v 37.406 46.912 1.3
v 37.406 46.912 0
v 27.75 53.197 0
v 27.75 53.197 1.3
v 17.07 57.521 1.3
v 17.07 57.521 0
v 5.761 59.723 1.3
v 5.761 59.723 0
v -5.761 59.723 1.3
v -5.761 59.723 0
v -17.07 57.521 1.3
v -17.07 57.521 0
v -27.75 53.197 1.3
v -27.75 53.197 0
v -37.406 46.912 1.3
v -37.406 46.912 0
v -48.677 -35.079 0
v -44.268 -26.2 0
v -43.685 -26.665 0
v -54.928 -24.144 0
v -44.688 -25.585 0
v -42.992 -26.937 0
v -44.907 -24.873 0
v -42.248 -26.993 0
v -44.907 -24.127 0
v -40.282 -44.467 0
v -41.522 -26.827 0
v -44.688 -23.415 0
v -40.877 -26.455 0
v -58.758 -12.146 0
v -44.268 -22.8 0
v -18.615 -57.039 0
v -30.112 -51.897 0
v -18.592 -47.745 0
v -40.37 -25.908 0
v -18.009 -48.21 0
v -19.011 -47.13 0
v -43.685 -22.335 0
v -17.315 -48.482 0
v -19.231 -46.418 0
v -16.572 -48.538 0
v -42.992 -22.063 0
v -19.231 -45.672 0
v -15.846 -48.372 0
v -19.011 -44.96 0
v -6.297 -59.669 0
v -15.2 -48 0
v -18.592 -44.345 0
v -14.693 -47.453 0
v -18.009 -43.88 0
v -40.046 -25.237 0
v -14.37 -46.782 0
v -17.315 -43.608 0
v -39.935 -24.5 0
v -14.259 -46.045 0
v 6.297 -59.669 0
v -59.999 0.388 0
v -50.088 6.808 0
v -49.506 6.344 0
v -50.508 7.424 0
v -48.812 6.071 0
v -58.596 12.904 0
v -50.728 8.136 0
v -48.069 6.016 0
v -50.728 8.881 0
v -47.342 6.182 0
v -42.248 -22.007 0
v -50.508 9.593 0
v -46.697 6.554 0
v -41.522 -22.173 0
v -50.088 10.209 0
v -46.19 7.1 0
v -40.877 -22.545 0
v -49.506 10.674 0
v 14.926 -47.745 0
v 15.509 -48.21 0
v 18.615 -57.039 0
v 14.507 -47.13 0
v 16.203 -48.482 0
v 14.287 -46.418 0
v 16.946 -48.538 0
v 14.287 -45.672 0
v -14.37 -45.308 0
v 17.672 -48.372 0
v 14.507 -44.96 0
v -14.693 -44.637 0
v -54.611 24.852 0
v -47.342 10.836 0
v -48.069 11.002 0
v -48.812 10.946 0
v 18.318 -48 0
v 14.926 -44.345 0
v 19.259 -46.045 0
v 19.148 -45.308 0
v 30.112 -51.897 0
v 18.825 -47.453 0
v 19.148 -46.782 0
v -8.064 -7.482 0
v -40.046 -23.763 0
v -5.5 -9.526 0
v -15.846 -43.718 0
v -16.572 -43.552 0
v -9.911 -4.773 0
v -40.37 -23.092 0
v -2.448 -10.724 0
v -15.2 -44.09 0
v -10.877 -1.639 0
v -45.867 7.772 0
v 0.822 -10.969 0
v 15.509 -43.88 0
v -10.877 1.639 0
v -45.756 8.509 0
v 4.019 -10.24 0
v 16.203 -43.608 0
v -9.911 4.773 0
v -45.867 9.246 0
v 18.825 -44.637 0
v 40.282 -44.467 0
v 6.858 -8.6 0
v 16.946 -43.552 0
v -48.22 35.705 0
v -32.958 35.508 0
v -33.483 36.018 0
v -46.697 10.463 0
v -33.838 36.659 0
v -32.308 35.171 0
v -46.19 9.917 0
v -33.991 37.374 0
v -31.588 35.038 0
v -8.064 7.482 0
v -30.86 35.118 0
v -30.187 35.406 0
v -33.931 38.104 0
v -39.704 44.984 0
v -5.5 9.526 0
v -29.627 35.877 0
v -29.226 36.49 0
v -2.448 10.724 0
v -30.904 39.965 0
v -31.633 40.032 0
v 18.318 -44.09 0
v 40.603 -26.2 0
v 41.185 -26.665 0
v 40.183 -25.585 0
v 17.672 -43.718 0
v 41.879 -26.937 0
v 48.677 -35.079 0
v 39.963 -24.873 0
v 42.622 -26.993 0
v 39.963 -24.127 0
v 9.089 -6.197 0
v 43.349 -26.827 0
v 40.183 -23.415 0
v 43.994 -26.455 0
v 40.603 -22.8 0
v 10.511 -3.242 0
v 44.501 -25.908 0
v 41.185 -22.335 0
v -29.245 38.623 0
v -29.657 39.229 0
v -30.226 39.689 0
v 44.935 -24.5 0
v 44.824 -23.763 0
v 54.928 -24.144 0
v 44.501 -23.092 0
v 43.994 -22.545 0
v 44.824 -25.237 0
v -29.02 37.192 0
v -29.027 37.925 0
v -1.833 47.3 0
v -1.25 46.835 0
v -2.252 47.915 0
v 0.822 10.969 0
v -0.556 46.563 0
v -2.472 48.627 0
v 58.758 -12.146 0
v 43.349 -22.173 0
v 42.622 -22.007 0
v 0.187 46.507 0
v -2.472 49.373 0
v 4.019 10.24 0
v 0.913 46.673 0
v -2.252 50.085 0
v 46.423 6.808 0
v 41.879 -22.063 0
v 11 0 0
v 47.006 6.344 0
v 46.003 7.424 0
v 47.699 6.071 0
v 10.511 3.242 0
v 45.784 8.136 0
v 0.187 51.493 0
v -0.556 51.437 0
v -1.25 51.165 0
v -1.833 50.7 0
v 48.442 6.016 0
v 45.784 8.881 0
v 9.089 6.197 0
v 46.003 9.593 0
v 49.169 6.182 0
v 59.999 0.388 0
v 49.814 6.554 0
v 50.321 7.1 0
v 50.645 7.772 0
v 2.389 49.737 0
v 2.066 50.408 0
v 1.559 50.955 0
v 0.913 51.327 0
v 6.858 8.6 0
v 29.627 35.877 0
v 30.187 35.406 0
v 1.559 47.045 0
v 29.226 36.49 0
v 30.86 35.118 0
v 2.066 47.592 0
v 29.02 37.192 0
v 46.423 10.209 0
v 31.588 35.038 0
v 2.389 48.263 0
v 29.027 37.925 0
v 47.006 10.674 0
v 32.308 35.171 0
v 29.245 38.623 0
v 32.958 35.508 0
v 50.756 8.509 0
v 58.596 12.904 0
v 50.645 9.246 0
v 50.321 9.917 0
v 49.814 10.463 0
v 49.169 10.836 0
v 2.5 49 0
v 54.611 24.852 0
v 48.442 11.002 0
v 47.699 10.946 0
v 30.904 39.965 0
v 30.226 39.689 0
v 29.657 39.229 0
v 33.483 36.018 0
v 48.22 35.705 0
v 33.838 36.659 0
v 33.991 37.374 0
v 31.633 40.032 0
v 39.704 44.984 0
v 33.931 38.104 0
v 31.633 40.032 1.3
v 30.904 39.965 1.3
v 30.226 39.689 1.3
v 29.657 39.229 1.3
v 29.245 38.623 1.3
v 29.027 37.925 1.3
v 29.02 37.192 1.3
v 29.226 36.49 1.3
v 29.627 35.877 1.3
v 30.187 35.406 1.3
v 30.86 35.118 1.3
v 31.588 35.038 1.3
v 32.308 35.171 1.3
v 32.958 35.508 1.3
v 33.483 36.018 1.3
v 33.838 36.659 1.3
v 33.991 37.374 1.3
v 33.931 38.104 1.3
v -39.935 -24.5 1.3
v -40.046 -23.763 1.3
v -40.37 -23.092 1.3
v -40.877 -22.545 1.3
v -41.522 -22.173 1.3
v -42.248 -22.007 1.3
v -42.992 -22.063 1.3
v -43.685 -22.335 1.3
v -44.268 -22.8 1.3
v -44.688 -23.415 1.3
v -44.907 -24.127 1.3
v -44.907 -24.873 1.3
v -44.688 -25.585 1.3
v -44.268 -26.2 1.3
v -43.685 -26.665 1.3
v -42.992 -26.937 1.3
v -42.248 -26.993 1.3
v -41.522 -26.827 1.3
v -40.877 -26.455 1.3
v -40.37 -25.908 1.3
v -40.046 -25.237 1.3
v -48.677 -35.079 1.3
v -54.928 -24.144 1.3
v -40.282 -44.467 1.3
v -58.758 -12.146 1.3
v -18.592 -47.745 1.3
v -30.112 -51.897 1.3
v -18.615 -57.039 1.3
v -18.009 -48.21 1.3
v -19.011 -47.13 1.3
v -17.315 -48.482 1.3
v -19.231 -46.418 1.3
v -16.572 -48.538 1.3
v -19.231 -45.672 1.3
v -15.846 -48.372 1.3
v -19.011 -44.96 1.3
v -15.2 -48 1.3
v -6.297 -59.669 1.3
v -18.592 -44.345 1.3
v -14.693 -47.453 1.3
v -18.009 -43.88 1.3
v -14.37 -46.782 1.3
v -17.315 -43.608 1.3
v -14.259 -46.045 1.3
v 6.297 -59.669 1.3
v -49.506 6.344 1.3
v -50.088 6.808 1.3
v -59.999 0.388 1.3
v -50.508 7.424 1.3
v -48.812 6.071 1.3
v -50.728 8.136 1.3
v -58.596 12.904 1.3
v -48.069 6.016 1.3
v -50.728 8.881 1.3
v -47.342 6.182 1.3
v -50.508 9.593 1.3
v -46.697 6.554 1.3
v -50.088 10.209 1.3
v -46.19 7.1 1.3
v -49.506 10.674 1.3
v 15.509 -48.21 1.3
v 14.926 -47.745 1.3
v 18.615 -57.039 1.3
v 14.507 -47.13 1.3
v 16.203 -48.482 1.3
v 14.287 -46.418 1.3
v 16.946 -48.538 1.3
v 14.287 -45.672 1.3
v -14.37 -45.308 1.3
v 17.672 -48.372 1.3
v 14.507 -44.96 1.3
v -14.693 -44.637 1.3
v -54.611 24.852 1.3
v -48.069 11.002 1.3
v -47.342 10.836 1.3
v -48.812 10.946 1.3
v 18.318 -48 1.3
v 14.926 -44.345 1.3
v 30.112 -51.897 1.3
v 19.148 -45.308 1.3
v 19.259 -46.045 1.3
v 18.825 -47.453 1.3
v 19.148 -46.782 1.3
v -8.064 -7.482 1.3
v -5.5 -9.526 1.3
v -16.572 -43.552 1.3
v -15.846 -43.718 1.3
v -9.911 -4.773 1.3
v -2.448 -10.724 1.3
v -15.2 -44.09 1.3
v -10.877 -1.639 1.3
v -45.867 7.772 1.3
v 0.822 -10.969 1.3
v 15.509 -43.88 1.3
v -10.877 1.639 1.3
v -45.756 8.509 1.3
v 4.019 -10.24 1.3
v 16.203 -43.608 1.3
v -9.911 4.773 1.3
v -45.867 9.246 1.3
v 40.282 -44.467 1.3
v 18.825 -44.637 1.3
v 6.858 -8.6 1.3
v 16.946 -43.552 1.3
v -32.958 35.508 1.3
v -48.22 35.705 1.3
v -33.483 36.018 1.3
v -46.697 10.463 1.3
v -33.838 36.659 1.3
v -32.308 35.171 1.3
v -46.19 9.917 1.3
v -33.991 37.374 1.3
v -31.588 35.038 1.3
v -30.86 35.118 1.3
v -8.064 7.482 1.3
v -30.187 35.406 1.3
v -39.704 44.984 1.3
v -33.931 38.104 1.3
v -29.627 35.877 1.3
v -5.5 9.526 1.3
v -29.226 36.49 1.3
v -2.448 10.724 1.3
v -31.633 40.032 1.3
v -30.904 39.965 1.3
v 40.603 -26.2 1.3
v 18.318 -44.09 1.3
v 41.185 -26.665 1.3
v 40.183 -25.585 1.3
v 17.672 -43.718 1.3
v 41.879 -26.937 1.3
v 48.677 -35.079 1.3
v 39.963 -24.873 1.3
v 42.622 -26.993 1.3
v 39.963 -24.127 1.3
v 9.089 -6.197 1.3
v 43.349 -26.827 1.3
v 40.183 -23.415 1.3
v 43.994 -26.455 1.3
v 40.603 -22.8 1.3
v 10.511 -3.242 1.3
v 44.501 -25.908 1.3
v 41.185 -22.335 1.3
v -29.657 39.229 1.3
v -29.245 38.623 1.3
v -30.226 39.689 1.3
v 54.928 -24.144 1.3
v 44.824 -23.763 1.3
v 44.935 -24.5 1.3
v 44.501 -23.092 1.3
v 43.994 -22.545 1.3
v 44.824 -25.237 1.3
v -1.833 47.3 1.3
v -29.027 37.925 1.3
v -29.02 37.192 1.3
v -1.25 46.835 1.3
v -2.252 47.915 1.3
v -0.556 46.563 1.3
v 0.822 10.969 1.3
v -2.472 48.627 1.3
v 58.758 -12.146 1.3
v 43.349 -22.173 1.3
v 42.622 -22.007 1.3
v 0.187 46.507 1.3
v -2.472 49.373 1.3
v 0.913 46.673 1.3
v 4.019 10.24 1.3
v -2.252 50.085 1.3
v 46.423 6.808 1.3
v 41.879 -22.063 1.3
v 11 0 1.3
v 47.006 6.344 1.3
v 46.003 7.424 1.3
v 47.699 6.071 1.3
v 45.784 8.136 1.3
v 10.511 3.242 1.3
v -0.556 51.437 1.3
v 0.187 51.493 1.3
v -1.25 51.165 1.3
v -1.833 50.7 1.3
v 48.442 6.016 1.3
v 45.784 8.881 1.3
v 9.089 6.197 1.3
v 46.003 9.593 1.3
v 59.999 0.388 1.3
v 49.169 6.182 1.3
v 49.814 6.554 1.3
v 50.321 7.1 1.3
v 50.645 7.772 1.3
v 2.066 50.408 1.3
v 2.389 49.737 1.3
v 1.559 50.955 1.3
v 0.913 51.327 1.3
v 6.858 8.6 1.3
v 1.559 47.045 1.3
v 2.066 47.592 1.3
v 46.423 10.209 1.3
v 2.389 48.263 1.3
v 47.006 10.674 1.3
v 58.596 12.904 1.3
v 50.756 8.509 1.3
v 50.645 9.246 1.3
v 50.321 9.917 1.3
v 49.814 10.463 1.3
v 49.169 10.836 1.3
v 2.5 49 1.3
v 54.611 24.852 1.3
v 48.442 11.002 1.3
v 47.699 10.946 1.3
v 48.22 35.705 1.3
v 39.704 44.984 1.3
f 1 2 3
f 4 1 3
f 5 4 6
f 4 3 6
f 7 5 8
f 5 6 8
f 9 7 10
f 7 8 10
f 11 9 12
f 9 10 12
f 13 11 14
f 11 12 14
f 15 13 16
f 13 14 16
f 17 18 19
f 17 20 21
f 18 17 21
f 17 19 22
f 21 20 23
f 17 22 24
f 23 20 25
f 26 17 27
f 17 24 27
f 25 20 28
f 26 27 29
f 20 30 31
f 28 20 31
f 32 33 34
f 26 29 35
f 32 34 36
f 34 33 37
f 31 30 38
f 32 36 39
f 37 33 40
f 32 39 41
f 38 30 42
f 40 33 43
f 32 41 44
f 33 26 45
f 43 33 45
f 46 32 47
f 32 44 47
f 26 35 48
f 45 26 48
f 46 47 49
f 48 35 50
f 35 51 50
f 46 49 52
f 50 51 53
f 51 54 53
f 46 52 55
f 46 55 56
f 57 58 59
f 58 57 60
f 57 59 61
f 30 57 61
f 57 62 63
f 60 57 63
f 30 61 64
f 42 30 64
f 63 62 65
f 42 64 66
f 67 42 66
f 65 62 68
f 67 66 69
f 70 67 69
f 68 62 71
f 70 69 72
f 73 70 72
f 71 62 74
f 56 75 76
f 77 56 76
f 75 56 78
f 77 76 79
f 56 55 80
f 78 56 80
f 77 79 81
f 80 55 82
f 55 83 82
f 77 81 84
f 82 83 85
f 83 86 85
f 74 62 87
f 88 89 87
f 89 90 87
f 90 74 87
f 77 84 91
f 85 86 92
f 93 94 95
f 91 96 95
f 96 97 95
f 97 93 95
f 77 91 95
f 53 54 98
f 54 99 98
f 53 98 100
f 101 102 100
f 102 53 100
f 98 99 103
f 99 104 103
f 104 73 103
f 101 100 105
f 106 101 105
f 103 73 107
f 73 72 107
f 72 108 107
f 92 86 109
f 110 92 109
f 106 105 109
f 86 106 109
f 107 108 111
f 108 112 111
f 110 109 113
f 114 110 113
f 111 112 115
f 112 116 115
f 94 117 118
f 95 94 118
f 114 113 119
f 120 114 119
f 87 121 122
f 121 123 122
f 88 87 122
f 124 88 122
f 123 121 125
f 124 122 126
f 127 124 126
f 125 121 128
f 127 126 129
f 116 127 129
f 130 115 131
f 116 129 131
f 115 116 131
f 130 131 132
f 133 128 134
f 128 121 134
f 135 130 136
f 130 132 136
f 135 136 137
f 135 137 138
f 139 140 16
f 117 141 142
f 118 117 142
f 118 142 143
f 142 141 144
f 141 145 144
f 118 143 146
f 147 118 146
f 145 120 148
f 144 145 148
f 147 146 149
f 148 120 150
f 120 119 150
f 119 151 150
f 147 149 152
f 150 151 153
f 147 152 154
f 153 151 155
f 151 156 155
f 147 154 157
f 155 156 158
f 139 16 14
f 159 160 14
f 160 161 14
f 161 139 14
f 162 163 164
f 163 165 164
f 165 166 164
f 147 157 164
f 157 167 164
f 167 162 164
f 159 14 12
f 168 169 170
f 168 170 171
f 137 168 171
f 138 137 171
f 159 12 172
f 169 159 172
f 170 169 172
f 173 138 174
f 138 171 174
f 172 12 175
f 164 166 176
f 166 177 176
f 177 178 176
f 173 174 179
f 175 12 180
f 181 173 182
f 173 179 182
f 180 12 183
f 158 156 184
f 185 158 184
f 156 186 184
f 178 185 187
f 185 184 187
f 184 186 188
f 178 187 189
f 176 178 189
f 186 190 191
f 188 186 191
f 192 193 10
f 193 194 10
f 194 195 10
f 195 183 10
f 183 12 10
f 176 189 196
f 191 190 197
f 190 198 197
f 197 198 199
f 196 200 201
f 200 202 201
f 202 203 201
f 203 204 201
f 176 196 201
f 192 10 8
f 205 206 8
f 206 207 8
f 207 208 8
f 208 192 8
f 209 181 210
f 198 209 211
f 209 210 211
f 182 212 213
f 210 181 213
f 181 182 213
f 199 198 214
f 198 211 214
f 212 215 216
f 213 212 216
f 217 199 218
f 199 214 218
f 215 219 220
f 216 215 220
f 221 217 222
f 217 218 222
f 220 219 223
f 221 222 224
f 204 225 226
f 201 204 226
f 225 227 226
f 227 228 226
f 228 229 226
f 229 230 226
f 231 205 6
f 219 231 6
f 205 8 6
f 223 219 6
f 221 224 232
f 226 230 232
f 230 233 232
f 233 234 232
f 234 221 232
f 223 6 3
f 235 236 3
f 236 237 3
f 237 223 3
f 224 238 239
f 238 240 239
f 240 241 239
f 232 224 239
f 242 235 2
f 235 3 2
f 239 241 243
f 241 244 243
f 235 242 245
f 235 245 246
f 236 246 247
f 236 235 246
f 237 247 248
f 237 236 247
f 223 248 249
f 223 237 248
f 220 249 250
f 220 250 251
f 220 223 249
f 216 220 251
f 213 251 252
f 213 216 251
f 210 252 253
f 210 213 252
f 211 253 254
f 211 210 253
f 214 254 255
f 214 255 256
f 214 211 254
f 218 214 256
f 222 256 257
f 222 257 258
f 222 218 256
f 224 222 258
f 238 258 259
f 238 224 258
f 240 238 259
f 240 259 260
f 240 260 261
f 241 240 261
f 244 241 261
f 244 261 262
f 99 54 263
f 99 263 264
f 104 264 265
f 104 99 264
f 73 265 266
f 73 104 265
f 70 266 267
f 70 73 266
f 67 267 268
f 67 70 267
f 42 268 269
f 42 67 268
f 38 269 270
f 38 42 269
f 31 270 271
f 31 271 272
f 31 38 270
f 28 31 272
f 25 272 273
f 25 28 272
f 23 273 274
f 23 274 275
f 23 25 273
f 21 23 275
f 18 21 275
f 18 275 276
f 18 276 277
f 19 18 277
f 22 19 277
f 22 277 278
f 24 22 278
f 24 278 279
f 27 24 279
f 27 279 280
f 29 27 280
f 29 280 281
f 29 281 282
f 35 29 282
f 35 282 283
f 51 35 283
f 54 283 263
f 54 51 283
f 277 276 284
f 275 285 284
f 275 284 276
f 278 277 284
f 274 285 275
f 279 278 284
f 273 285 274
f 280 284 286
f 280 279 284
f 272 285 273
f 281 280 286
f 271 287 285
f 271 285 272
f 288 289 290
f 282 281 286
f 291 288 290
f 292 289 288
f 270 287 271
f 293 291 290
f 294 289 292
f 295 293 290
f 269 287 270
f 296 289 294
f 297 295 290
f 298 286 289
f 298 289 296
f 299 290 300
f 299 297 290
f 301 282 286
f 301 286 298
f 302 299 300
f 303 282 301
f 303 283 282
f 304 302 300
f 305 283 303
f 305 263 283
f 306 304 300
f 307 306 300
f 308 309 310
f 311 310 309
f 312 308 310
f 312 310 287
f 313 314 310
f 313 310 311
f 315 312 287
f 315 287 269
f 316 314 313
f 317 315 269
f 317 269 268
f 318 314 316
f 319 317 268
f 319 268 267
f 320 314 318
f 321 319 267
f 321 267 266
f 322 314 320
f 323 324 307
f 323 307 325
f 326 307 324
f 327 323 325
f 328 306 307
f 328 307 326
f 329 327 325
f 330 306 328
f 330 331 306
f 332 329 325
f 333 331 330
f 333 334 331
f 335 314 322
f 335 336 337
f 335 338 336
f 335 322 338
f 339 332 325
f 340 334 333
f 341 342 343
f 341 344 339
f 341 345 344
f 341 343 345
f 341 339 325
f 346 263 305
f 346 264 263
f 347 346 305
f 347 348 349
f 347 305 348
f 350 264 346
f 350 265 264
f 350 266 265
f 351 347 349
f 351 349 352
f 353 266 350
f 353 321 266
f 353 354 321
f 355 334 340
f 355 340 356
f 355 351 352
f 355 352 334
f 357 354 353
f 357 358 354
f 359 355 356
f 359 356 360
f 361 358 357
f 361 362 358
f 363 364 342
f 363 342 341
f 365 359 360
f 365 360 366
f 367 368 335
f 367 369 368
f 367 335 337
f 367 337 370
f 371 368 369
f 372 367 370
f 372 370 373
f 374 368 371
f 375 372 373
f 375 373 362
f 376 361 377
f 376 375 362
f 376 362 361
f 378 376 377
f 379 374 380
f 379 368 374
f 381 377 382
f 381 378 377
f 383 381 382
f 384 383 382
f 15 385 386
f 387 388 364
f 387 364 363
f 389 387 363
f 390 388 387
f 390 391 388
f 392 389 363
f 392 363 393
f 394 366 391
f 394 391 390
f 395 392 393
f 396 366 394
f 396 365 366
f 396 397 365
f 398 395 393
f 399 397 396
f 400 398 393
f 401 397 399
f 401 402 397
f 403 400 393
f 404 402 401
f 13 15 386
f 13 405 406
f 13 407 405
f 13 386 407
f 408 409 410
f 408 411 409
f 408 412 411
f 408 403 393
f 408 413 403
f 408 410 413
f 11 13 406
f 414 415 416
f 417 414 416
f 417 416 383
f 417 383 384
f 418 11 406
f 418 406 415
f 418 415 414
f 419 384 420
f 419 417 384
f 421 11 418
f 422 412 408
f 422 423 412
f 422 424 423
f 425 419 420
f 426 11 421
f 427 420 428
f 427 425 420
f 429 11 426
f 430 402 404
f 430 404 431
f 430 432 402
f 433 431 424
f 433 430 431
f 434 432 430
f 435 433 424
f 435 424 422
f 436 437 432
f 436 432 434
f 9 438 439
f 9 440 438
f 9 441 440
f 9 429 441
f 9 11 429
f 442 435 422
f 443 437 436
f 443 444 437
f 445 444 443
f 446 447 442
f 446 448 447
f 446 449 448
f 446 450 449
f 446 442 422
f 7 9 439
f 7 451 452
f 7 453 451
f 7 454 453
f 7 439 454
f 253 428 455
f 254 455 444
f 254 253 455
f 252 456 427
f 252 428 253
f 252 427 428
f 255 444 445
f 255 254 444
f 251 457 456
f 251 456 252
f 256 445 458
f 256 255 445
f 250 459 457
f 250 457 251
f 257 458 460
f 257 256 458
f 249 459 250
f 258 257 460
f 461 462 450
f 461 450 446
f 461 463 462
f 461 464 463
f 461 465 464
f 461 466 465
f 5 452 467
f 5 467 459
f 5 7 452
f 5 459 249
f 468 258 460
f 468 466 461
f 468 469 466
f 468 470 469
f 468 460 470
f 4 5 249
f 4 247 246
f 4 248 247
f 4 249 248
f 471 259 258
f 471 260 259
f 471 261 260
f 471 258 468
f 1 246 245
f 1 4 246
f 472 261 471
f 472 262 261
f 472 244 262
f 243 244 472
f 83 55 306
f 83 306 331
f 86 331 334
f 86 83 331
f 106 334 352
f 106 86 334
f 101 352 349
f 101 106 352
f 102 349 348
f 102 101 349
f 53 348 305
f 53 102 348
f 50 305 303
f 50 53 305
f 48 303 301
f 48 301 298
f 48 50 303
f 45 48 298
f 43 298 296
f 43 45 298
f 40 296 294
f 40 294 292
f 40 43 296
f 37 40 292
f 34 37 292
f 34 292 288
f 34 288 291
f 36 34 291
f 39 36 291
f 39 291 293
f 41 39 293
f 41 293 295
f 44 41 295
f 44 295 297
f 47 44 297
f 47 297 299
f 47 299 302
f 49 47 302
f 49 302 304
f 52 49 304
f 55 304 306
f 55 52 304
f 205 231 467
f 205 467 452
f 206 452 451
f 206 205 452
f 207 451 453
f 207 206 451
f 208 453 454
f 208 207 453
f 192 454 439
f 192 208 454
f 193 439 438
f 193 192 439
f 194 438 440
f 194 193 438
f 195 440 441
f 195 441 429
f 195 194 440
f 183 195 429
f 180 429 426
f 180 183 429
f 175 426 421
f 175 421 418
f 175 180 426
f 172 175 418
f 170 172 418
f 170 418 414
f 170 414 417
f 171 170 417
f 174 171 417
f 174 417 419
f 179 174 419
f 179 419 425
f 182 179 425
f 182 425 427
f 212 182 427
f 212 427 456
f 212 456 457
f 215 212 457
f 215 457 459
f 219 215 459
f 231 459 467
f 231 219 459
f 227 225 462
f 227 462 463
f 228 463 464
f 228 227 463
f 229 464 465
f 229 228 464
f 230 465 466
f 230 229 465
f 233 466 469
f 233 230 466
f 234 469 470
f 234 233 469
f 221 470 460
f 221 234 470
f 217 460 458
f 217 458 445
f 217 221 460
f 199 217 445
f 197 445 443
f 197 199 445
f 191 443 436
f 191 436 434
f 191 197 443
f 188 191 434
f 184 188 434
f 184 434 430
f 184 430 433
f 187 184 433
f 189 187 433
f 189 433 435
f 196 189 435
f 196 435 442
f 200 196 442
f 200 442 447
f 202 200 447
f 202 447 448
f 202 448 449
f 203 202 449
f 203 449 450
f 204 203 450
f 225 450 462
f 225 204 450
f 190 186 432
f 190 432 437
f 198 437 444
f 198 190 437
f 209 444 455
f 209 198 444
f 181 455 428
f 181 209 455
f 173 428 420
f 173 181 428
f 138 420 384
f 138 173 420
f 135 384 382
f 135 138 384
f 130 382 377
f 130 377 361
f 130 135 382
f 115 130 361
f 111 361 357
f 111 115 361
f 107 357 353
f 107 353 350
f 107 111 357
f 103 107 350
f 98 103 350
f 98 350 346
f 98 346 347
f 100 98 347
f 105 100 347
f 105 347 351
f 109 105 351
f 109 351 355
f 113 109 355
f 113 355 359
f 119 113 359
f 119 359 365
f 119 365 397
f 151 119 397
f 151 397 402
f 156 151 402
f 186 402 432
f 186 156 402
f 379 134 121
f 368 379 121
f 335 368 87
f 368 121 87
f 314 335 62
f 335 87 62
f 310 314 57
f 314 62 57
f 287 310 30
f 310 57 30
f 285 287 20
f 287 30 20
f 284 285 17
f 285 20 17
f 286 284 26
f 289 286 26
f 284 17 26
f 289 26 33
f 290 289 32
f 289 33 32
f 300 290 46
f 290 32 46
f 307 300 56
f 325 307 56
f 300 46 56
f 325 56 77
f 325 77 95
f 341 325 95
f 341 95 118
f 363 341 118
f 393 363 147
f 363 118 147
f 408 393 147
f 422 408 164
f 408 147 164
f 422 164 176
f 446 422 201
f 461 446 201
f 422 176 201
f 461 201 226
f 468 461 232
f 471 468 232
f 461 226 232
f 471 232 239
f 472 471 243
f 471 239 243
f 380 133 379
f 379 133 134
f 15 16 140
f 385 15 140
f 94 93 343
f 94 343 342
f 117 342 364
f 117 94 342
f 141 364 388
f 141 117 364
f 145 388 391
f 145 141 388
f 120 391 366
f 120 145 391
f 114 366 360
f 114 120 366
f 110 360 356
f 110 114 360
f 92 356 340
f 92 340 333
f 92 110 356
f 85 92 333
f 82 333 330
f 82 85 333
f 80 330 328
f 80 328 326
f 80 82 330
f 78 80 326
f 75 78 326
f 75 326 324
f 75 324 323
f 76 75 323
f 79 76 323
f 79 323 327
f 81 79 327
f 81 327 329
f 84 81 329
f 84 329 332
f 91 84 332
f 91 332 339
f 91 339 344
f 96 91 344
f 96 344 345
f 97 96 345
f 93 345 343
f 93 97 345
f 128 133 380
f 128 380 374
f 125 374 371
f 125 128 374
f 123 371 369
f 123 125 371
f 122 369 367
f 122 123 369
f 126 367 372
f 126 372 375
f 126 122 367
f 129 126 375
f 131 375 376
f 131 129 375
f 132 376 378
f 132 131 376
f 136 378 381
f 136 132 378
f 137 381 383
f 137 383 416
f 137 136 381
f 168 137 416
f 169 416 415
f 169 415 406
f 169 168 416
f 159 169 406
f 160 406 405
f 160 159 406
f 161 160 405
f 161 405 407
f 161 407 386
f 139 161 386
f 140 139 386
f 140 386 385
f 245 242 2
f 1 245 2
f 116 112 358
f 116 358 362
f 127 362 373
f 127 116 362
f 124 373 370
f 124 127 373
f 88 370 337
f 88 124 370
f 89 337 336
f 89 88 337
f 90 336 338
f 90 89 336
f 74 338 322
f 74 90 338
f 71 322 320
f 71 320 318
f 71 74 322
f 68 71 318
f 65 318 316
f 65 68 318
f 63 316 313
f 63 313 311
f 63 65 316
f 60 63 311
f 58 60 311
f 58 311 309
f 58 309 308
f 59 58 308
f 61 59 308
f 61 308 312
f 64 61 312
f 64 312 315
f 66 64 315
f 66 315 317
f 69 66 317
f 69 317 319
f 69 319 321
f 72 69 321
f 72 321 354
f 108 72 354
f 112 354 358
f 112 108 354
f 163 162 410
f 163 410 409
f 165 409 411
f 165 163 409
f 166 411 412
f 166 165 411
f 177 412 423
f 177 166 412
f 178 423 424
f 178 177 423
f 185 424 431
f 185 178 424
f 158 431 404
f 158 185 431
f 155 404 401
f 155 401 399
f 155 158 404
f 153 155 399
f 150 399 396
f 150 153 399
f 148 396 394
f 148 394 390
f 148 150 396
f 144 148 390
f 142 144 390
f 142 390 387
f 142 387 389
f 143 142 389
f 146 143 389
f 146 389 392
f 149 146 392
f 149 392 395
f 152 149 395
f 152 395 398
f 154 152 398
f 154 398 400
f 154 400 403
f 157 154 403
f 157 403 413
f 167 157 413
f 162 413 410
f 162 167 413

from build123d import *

# Parameters (mm, degrees)
SKETCH_R   = 11
SKETCH_R_2 = 2.5
PAD_DEPTH  = 1.3


with BuildPart() as part:
    # Sketch → Pad (new body)
    with BuildSketch(Plane.XY):
        with BuildLine():
            ThreePointArc((37.406136, 46.912482), (0, 60), (-37.406136, 46.912482))
            Line((-37.406136, 46.912482), (-31.633101, 40.032448))
            ThreePointArc((-33.931235, 38.104085), (-29.889624, 35.621067), (-31.633101, 40.032448))
            Line((-33.931235, 38.104085), (-39.704269, 44.98412))
            ThreePointArc((-39.704269, 44.98412), (0, -60), (39.704269, 44.98412))
            Line((33.931235, 38.104085), (39.704269, 44.98412))
            ThreePointArc((31.633101, 40.032448), (29.889624, 35.621067), (33.931235, 38.104085))
            Line((31.633101, 40.032448), (37.406136, 46.912482))
        make_face()
        Circle(SKETCH_R, mode=Mode.SUBTRACT)
        with Locations((0, 49)):
            Circle(SKETCH_R_2, mode=Mode.SUBTRACT)
        with Locations((48.25558, 8.508761)):
            Circle(SKETCH_R_2, mode=Mode.SUBTRACT)
        with Locations((42.435245, -24.5)):
            Circle(SKETCH_R_2, mode=Mode.SUBTRACT)
        with Locations((16.758987, -46.044938)):
            Circle(SKETCH_R_2, mode=Mode.SUBTRACT)
        with Locations((-16.758987, -46.044938)):
            Circle(SKETCH_R_2, mode=Mode.SUBTRACT)
        with Locations((-42.435245, -24.5)):
            Circle(SKETCH_R_2, mode=Mode.SUBTRACT)
        with Locations((-48.25558, 8.508761)):
            Circle(SKETCH_R_2, mode=Mode.SUBTRACT)
    extrude(amount=PAD_DEPTH)


solid = part.part
